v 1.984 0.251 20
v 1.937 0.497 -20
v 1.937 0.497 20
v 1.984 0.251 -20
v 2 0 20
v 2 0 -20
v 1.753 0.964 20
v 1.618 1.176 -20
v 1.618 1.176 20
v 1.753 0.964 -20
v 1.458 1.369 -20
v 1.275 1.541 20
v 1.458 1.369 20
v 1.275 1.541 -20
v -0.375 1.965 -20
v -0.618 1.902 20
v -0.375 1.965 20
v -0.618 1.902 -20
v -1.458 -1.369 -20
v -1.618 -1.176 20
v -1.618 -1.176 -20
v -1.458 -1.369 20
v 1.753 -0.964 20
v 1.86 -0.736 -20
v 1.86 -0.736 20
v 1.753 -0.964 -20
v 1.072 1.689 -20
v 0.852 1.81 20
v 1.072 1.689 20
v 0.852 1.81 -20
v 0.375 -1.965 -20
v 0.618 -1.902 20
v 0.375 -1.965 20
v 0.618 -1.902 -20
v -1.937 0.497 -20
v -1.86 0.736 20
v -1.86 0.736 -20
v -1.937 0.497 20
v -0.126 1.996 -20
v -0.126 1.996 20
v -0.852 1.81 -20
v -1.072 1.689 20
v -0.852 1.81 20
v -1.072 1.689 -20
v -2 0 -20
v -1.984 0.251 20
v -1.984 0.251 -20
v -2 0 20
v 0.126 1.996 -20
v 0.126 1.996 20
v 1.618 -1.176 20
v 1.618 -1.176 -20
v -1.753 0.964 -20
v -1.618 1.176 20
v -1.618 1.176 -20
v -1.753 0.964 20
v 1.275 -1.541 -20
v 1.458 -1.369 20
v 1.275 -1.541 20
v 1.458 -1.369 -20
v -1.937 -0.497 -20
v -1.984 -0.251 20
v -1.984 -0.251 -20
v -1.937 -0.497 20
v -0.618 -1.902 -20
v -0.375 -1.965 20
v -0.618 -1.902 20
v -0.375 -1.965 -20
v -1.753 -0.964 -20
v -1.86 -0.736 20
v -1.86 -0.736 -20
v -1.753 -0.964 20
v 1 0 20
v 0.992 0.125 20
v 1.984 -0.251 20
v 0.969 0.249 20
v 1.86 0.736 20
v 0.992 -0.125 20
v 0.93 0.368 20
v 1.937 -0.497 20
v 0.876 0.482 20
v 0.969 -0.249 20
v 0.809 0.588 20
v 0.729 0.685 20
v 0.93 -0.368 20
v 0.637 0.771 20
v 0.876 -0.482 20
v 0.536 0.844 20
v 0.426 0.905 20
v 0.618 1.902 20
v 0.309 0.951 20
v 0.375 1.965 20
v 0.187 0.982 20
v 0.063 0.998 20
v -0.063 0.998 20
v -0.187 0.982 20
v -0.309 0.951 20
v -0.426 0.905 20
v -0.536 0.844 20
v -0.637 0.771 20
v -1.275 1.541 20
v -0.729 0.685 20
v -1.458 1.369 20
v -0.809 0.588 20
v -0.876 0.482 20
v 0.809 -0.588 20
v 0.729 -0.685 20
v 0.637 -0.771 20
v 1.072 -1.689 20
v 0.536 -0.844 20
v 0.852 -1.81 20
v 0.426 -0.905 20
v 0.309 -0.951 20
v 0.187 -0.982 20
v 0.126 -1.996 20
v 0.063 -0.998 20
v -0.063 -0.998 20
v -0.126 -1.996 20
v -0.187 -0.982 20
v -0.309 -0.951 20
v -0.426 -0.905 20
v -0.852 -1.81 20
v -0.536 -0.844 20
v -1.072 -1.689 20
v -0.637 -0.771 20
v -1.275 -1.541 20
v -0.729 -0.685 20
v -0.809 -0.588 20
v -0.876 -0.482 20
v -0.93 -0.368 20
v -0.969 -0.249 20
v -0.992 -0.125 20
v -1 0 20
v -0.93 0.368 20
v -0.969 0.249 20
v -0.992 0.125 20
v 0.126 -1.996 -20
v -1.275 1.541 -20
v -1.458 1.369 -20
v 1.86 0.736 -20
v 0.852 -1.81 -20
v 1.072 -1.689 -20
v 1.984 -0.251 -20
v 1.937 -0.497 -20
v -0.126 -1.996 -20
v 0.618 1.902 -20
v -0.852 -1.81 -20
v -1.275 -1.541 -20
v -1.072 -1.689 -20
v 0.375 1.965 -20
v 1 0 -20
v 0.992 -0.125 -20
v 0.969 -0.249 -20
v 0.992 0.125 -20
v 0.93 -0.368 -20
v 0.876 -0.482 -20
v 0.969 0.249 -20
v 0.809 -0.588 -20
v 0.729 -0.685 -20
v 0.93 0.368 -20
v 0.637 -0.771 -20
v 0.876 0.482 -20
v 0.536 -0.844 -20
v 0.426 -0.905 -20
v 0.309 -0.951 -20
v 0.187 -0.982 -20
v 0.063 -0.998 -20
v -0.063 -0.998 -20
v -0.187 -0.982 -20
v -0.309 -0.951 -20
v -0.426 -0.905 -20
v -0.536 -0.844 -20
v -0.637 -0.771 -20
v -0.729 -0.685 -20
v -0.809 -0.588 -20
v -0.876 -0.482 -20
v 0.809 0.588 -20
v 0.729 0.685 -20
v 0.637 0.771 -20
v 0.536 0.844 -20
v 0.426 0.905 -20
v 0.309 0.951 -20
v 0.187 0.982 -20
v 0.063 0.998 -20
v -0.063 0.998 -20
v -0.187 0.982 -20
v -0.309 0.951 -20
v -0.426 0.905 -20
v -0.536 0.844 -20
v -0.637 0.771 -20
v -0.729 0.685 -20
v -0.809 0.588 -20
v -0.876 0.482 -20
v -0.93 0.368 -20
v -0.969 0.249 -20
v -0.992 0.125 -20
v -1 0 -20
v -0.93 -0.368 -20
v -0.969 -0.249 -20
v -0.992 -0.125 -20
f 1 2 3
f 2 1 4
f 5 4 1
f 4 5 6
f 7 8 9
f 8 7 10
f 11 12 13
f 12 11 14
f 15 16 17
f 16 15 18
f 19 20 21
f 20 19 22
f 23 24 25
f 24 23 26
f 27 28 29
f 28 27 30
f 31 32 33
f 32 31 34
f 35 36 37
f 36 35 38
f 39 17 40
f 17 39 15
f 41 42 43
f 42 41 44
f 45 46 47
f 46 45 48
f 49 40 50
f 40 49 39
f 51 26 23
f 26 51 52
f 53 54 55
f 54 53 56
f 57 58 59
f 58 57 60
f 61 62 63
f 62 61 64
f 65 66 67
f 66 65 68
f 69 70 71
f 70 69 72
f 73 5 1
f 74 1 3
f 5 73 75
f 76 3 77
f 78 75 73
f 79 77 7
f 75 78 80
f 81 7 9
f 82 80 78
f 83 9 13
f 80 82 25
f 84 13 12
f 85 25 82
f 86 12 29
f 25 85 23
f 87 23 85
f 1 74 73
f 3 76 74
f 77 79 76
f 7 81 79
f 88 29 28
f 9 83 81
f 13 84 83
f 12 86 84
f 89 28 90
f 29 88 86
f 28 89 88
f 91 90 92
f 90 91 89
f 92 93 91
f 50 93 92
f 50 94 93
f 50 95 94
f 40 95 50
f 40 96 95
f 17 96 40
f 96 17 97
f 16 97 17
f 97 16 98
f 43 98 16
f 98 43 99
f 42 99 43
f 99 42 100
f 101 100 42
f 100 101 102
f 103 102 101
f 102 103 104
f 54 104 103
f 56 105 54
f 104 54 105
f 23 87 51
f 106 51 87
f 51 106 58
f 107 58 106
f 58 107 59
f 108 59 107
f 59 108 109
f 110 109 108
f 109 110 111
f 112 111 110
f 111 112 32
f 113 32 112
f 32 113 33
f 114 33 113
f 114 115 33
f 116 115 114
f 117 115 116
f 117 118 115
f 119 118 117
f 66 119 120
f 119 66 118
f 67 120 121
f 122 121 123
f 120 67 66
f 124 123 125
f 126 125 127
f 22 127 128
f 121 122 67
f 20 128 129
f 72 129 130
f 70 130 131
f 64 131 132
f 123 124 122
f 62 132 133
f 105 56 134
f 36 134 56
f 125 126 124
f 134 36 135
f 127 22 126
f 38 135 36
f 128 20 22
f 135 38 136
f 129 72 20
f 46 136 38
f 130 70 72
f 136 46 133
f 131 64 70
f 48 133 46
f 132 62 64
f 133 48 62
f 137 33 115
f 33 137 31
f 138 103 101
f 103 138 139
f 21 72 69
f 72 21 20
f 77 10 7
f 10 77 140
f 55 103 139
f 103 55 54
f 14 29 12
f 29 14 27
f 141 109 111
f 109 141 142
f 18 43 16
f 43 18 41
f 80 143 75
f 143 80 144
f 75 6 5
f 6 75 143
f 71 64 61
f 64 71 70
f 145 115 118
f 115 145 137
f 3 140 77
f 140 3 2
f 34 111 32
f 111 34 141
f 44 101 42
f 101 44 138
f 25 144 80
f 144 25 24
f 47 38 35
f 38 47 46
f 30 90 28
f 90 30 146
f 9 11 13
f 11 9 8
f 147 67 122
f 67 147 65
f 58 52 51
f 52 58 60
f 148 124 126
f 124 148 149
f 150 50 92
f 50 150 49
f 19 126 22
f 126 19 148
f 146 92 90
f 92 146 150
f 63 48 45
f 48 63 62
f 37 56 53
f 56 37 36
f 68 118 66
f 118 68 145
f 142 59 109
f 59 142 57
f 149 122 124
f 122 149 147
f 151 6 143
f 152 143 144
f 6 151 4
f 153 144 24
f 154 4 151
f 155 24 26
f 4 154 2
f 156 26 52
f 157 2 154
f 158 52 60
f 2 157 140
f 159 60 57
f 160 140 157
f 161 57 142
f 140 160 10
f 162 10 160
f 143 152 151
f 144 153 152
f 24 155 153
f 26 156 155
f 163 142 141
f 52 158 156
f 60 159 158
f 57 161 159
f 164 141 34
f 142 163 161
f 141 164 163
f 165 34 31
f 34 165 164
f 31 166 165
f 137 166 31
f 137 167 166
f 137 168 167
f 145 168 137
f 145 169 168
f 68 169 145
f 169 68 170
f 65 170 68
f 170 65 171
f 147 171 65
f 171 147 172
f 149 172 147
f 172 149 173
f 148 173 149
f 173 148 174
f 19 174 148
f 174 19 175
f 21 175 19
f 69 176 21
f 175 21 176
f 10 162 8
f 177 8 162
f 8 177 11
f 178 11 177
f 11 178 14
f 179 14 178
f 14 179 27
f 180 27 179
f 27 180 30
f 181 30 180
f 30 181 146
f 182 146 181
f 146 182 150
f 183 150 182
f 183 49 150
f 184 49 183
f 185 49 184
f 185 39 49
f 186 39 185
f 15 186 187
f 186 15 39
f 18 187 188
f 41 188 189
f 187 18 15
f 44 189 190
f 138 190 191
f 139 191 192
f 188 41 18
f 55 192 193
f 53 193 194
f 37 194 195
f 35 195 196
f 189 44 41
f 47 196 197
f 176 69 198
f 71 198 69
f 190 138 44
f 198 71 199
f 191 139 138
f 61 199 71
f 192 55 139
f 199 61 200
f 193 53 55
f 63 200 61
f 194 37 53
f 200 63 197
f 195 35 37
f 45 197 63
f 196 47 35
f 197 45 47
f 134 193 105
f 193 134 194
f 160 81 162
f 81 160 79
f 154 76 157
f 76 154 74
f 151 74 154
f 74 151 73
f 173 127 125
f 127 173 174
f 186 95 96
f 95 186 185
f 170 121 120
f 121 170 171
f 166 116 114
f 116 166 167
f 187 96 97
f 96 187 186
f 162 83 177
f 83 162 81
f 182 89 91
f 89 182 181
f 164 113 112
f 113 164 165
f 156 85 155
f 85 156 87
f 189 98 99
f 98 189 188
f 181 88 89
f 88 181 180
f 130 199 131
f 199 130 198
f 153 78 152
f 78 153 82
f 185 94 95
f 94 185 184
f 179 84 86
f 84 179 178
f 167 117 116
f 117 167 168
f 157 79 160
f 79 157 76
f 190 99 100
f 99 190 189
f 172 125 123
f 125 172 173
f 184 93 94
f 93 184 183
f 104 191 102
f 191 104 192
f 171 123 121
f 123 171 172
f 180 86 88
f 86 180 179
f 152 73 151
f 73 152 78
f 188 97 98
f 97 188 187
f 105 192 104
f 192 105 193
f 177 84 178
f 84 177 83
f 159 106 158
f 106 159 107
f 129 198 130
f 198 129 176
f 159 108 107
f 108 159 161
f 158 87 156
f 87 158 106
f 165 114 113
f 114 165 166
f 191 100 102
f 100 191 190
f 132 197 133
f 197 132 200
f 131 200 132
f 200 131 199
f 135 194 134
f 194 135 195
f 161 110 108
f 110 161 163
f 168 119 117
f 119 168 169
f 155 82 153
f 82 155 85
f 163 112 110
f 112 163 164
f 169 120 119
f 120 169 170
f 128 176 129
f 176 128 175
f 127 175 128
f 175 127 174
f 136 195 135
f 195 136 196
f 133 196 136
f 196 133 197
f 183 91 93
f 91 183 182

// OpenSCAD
$fn = 50;


difference() {
	union() {
		translate(v = [0, 0, -20.0000000000]) {
			cylinder(h = 40, r = 2.0000000000);
		}
	}
	union() {
		translate(v = [0, 0, -100.0000000000]) {
			cylinder(h = 200, r = 1.0000000000);
		}
	}
}
